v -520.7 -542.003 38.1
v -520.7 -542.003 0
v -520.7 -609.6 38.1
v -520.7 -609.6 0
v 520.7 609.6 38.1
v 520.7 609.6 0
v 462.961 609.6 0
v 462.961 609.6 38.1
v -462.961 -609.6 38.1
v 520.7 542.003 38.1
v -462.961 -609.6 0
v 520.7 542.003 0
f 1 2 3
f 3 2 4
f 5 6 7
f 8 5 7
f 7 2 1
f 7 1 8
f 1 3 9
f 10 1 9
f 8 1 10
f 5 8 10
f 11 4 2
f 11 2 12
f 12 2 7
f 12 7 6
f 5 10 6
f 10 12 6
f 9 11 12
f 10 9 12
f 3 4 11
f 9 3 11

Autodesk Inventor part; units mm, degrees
ref_plane "YZ Plane" through (0, 0, 0) normal (1, 0, 0) x (0, 1, 0)
ref_plane "XZ Plane" through (0, 0, 0) normal (0, 1, 0) x (-1, 0, 0)
ref_plane "XY Plane" through (0, 0, 0) normal (0, 0, 1) x (1, 0, 0)
sketch "Sketch1" plane through (0, 0, 0) normal (0, 0, 1) x (1, 0, 0)
  line L0 (-520.7, -609.6) -> (520.7, -609.6)
  line L1 (520.7, -609.6) -> (520.7, 609.6)
  line L2 (520.7, 609.6) -> (-520.7, 609.6)
  line L3 (-520.7, 609.6) -> (-520.7, -609.6)
  line L4 (-520.7, -609.6) -> (520.7, 609.6) construction
  line L5 (520.7, -609.6) -> (-520.7, 609.6) construction
  line L6 (28.8696, -33.7986) -> (-28.8696, 33.7986)
  line L7 (-520.7, -542.0028) -> (462.9607, 609.6)
  line L8 (-462.9607, -609.6) -> (520.7, 542.0028)
  point P0 (0, 0)
  dimension "d0" = 1219.2
  dimension "d1" = 1041.4
  dimension "d3" = 88.9
extrude "Extrusion1" add sketch "Sketch1" along normal blind 38.1 contours L3 L7 L6 L8 L0 | L6 L7 L2 L1 L8
properties part number "S_2x4x63.127"
